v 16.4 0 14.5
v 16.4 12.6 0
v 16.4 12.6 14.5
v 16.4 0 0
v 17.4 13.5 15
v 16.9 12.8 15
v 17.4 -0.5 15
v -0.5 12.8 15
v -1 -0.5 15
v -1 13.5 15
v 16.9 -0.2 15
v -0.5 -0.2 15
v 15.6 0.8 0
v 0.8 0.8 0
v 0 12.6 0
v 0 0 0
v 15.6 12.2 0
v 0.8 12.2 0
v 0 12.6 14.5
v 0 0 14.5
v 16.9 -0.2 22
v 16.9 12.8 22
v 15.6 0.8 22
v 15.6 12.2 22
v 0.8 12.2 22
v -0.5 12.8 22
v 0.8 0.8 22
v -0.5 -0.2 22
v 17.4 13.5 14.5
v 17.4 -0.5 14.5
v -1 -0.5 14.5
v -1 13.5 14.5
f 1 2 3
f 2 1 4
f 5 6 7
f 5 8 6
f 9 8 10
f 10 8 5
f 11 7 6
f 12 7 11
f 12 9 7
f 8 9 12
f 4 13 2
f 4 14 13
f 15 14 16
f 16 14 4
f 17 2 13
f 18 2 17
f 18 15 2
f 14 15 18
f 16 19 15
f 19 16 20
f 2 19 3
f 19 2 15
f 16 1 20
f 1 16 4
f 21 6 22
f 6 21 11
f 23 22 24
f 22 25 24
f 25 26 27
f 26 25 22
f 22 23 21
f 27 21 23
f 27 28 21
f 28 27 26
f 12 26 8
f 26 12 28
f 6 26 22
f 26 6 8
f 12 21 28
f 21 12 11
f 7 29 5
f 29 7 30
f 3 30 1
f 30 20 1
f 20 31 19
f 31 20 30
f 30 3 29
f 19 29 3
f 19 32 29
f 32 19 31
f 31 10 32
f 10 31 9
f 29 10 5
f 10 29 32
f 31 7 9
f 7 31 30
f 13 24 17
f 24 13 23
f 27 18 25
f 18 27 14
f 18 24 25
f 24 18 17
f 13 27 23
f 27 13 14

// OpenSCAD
top_width = 17.4;
top_depth = 13;
top_height = 7;
wall_thickness = 0.8;
bottom_width= 16.4;
bottom_depth = 12.6;
bottom_height = 15;

ridge = 0.5;

difference()
{
    union()
    {
        cube([bottom_width,bottom_depth,bottom_height]);
        
        translate([-((top_width-bottom_width)/2), -((top_depth-bottom_depth)/2),bottom_height])
            cube([top_width,top_depth,top_height]);
        
        translate([(-((top_width-bottom_width)/2))-ridge,-ridge,bottom_height-ridge])
            cube([top_width+ridge+ridge,top_depth+ridge+ridge,ridge]);
            
    }
    
    translate([wall_thickness,wall_thickness,0])
        cube([bottom_width-wall_thickness-wall_thickness, top_depth-wall_thickness-wall_thickness, top_height+bottom_height]);

}
